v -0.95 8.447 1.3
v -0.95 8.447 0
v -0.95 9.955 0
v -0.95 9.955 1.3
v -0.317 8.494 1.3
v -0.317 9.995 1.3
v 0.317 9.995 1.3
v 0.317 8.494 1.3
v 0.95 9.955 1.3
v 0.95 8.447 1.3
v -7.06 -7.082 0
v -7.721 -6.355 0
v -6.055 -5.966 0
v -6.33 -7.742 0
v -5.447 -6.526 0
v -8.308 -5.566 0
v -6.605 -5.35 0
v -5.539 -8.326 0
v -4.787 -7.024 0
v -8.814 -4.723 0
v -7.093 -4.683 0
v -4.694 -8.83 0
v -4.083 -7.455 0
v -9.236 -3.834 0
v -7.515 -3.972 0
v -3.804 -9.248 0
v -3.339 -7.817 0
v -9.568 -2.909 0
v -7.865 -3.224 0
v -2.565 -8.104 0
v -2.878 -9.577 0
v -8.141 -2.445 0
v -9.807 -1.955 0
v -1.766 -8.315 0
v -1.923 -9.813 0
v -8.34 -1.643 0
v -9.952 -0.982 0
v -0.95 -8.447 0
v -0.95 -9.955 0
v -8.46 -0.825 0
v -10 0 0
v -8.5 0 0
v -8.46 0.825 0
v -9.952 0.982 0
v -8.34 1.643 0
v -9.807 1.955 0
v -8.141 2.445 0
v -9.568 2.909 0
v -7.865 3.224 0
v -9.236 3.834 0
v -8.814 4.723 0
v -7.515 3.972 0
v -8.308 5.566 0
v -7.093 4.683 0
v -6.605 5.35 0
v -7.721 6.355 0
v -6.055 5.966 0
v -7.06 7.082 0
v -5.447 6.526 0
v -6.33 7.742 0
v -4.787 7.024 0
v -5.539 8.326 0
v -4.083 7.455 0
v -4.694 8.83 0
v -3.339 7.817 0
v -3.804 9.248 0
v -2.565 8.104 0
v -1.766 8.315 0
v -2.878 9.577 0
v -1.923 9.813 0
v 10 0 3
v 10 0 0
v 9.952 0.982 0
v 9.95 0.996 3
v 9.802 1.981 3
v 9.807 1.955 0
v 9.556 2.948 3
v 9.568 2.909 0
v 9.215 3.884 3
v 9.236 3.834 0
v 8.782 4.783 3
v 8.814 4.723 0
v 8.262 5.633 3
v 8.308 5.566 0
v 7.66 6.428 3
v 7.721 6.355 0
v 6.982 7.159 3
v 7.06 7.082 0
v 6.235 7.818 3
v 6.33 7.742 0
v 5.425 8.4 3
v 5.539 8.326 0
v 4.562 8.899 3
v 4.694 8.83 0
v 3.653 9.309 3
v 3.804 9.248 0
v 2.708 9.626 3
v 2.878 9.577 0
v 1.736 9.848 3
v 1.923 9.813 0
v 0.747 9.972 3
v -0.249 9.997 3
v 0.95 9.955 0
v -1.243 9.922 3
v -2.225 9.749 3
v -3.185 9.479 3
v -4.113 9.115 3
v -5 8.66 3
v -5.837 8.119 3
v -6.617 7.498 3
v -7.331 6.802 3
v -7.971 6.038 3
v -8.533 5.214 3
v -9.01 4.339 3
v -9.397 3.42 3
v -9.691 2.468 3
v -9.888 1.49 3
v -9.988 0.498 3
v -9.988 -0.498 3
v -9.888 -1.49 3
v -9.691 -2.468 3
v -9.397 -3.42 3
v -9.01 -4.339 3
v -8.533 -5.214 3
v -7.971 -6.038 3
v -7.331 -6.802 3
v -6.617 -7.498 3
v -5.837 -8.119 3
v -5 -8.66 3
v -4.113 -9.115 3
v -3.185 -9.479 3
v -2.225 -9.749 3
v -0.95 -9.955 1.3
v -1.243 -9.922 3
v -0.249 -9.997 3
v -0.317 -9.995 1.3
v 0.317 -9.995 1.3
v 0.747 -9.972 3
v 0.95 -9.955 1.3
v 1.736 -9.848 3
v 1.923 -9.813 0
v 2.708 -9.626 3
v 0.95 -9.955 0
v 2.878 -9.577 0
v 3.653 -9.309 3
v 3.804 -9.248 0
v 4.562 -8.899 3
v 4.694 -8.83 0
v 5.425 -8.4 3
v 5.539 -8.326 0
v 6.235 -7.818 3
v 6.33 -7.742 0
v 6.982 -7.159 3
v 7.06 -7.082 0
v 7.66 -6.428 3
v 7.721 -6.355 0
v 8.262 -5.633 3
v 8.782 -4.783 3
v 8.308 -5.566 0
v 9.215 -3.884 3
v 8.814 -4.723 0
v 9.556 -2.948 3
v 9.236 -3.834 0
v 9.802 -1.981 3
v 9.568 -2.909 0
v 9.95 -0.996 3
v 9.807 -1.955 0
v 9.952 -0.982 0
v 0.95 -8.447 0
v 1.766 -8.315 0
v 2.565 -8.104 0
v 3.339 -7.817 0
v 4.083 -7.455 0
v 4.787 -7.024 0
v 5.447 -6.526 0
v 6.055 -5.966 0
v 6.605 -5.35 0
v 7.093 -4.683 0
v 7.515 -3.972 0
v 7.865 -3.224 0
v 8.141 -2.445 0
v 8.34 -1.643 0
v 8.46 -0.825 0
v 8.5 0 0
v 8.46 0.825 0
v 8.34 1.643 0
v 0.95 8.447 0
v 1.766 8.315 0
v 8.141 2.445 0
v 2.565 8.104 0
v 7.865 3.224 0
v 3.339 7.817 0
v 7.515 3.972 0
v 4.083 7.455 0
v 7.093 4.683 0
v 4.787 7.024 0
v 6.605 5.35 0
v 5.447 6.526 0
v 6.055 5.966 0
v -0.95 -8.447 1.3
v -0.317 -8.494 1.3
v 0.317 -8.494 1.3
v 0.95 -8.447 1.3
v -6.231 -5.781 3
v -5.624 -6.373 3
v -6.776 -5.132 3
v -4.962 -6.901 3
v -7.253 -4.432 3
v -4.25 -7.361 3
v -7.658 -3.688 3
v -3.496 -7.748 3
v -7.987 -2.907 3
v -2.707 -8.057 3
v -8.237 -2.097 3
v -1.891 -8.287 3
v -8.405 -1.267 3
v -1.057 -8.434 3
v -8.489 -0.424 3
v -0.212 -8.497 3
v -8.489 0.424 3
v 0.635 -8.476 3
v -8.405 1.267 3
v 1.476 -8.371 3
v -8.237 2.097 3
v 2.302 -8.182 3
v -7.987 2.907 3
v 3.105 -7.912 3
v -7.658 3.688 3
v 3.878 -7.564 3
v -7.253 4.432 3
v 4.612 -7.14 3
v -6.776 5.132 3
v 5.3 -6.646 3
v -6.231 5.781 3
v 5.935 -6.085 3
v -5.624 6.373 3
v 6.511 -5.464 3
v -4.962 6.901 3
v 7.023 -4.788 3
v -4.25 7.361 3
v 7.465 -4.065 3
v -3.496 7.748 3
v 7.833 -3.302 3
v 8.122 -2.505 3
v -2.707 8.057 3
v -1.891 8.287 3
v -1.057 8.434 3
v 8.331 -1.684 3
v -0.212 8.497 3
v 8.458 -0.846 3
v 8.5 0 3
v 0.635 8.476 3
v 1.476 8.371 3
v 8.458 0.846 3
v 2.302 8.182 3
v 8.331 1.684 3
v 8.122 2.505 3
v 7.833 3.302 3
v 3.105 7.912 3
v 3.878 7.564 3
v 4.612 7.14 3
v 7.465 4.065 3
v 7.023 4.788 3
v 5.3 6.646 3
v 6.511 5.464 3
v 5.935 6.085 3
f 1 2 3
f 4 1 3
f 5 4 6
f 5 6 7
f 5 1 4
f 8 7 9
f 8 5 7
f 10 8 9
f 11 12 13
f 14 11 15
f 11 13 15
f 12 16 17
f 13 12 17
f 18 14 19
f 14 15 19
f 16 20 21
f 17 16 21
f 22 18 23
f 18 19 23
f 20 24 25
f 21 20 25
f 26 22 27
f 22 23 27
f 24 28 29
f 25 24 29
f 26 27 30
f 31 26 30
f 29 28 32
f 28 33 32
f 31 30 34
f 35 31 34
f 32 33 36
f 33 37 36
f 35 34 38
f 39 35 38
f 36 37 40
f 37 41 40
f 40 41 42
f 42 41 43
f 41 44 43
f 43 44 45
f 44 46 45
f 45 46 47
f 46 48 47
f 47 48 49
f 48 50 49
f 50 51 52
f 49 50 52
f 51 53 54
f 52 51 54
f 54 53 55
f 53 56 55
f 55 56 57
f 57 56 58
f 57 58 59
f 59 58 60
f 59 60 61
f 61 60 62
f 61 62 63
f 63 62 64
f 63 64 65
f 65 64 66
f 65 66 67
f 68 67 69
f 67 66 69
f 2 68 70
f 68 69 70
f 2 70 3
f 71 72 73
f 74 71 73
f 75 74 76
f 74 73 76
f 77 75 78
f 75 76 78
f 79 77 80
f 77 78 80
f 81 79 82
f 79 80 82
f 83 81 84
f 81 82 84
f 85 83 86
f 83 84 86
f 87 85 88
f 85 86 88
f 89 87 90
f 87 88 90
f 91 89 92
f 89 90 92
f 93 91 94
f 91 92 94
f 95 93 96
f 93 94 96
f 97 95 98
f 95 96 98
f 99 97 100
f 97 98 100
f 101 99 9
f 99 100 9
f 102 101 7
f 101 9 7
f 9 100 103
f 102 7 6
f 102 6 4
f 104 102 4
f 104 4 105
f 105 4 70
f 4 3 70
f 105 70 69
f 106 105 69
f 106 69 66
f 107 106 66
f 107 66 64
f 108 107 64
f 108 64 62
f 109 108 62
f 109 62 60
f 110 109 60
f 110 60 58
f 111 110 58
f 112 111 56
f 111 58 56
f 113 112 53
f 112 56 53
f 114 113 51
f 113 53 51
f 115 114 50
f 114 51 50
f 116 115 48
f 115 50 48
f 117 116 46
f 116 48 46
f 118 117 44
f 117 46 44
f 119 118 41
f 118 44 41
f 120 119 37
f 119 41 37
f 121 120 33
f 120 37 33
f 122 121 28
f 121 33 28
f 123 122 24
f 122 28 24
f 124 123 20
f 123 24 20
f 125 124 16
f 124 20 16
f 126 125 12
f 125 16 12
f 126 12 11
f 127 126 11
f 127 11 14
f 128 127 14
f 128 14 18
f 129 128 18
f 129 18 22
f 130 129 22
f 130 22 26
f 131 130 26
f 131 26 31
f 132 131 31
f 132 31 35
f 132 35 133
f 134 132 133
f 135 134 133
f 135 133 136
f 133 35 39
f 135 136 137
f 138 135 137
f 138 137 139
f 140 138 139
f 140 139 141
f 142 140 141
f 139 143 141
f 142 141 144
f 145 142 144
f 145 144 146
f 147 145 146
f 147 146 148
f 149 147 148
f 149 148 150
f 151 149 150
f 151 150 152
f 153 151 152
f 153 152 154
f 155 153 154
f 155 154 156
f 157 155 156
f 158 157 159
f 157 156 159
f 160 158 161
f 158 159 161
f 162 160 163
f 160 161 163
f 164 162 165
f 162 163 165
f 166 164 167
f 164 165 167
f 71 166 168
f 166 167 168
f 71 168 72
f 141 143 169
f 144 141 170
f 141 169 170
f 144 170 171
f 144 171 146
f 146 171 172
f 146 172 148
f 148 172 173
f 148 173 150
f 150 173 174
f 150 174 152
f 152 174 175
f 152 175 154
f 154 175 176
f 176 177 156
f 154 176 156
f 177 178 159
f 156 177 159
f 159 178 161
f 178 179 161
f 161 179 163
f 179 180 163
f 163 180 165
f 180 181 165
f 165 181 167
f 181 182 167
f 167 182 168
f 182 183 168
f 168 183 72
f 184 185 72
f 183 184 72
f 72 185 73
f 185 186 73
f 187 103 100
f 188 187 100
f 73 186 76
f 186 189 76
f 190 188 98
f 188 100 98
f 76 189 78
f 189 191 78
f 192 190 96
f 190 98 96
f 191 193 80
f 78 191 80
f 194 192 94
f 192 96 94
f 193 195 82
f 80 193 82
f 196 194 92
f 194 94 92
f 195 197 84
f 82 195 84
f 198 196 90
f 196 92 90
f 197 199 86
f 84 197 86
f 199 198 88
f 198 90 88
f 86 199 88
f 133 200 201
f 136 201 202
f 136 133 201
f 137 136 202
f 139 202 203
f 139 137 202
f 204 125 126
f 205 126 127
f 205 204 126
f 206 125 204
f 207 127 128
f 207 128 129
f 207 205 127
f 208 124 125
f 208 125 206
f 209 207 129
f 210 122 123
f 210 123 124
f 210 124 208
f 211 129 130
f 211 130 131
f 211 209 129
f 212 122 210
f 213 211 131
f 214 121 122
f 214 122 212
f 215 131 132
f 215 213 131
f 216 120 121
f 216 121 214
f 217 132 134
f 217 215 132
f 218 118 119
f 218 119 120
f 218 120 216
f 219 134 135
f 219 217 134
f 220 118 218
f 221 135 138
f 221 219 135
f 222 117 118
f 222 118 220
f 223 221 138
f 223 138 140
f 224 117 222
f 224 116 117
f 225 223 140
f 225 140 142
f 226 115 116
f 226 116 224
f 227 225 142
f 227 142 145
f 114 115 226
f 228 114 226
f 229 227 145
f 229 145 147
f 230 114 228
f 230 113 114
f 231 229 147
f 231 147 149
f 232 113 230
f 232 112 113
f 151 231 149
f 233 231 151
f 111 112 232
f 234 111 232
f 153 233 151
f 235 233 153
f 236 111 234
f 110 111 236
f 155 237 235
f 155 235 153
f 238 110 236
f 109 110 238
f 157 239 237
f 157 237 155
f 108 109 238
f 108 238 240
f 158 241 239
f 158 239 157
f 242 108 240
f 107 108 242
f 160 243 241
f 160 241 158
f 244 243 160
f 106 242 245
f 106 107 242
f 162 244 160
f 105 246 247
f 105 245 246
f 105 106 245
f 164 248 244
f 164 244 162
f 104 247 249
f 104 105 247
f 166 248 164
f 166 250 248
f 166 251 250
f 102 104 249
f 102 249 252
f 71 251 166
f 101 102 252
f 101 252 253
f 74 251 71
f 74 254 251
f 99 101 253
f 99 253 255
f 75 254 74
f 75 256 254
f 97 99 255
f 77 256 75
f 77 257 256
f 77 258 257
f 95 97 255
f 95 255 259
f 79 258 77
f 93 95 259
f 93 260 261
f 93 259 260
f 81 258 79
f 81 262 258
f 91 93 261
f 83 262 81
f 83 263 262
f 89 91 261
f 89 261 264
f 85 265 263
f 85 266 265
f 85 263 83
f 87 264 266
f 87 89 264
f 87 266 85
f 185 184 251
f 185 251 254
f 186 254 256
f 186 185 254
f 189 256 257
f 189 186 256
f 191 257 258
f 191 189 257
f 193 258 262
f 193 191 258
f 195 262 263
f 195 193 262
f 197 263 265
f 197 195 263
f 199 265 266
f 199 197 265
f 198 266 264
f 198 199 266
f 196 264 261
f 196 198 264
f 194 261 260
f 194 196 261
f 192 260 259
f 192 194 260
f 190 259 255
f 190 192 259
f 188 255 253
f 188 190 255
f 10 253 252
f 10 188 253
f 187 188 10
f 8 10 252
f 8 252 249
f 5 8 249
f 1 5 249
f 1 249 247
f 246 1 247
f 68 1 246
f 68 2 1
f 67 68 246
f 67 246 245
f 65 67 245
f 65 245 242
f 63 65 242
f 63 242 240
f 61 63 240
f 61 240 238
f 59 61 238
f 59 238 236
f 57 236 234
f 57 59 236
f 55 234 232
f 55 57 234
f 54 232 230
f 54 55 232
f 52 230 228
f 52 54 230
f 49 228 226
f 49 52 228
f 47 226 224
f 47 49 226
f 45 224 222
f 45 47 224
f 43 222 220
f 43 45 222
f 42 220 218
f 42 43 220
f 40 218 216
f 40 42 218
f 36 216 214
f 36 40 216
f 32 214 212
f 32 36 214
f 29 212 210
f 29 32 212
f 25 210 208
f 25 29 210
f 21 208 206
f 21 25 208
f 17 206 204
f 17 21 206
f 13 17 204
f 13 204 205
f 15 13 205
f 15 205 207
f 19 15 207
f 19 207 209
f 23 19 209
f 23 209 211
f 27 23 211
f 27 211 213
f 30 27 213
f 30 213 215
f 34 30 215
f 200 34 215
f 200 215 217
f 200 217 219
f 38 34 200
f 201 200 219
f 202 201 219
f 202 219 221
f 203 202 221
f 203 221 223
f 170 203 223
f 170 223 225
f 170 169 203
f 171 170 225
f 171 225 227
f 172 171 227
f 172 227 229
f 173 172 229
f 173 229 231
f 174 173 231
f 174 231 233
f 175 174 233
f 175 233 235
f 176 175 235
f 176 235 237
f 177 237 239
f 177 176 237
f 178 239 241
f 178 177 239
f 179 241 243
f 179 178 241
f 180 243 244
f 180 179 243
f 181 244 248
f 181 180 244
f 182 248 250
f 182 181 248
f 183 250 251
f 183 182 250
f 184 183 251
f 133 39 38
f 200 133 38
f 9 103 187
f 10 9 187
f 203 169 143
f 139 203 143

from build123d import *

# Parameters (mm, degrees)
F0_R     = 10
F0_R_2   = 8.5
F1_DEPTH = 3
F3_DEPTH = 1.3


with BuildPart() as f1:
    # F0 (on Top) → F1 (new body)
    with BuildSketch(Plane.XY):
        Circle(F0_R)
        Circle(F0_R_2, mode=Mode.SUBTRACT)
    extrude(amount=F1_DEPTH)

    # F2 (on face) → F3 (cut)
    with BuildSketch(Plane(origin=(0, 0, 0), x_dir=(1, 0, 0), z_dir=(0, 0, -1))):
        with BuildLine():
            ThreePointArc((0.95, 9.954773), (0, 10), (-0.95, 9.954773))
            Line((-0.95, 9.954773), (-0.95, 8.446745))
            ThreePointArc((-0.95, 8.446745), (0, 8.5), (0.95, 8.446745))
            Line((0.95, 8.446745), (0.95, 9.954773))
        make_face()
        with BuildLine():
            ThreePointArc((-0.95, -9.954773), (0, -10), (0.95, -9.954773))
            Line((0.95, -9.954773), (0.95, -8.446745))
            ThreePointArc((0.95, -8.446745), (0, -8.5), (-0.95, -8.446745))
            Line((-0.95, -8.446745), (-0.95, -9.954773))
        make_face()
    extrude(amount=-F3_DEPTH, mode=Mode.SUBTRACT)


solid = f1.part
